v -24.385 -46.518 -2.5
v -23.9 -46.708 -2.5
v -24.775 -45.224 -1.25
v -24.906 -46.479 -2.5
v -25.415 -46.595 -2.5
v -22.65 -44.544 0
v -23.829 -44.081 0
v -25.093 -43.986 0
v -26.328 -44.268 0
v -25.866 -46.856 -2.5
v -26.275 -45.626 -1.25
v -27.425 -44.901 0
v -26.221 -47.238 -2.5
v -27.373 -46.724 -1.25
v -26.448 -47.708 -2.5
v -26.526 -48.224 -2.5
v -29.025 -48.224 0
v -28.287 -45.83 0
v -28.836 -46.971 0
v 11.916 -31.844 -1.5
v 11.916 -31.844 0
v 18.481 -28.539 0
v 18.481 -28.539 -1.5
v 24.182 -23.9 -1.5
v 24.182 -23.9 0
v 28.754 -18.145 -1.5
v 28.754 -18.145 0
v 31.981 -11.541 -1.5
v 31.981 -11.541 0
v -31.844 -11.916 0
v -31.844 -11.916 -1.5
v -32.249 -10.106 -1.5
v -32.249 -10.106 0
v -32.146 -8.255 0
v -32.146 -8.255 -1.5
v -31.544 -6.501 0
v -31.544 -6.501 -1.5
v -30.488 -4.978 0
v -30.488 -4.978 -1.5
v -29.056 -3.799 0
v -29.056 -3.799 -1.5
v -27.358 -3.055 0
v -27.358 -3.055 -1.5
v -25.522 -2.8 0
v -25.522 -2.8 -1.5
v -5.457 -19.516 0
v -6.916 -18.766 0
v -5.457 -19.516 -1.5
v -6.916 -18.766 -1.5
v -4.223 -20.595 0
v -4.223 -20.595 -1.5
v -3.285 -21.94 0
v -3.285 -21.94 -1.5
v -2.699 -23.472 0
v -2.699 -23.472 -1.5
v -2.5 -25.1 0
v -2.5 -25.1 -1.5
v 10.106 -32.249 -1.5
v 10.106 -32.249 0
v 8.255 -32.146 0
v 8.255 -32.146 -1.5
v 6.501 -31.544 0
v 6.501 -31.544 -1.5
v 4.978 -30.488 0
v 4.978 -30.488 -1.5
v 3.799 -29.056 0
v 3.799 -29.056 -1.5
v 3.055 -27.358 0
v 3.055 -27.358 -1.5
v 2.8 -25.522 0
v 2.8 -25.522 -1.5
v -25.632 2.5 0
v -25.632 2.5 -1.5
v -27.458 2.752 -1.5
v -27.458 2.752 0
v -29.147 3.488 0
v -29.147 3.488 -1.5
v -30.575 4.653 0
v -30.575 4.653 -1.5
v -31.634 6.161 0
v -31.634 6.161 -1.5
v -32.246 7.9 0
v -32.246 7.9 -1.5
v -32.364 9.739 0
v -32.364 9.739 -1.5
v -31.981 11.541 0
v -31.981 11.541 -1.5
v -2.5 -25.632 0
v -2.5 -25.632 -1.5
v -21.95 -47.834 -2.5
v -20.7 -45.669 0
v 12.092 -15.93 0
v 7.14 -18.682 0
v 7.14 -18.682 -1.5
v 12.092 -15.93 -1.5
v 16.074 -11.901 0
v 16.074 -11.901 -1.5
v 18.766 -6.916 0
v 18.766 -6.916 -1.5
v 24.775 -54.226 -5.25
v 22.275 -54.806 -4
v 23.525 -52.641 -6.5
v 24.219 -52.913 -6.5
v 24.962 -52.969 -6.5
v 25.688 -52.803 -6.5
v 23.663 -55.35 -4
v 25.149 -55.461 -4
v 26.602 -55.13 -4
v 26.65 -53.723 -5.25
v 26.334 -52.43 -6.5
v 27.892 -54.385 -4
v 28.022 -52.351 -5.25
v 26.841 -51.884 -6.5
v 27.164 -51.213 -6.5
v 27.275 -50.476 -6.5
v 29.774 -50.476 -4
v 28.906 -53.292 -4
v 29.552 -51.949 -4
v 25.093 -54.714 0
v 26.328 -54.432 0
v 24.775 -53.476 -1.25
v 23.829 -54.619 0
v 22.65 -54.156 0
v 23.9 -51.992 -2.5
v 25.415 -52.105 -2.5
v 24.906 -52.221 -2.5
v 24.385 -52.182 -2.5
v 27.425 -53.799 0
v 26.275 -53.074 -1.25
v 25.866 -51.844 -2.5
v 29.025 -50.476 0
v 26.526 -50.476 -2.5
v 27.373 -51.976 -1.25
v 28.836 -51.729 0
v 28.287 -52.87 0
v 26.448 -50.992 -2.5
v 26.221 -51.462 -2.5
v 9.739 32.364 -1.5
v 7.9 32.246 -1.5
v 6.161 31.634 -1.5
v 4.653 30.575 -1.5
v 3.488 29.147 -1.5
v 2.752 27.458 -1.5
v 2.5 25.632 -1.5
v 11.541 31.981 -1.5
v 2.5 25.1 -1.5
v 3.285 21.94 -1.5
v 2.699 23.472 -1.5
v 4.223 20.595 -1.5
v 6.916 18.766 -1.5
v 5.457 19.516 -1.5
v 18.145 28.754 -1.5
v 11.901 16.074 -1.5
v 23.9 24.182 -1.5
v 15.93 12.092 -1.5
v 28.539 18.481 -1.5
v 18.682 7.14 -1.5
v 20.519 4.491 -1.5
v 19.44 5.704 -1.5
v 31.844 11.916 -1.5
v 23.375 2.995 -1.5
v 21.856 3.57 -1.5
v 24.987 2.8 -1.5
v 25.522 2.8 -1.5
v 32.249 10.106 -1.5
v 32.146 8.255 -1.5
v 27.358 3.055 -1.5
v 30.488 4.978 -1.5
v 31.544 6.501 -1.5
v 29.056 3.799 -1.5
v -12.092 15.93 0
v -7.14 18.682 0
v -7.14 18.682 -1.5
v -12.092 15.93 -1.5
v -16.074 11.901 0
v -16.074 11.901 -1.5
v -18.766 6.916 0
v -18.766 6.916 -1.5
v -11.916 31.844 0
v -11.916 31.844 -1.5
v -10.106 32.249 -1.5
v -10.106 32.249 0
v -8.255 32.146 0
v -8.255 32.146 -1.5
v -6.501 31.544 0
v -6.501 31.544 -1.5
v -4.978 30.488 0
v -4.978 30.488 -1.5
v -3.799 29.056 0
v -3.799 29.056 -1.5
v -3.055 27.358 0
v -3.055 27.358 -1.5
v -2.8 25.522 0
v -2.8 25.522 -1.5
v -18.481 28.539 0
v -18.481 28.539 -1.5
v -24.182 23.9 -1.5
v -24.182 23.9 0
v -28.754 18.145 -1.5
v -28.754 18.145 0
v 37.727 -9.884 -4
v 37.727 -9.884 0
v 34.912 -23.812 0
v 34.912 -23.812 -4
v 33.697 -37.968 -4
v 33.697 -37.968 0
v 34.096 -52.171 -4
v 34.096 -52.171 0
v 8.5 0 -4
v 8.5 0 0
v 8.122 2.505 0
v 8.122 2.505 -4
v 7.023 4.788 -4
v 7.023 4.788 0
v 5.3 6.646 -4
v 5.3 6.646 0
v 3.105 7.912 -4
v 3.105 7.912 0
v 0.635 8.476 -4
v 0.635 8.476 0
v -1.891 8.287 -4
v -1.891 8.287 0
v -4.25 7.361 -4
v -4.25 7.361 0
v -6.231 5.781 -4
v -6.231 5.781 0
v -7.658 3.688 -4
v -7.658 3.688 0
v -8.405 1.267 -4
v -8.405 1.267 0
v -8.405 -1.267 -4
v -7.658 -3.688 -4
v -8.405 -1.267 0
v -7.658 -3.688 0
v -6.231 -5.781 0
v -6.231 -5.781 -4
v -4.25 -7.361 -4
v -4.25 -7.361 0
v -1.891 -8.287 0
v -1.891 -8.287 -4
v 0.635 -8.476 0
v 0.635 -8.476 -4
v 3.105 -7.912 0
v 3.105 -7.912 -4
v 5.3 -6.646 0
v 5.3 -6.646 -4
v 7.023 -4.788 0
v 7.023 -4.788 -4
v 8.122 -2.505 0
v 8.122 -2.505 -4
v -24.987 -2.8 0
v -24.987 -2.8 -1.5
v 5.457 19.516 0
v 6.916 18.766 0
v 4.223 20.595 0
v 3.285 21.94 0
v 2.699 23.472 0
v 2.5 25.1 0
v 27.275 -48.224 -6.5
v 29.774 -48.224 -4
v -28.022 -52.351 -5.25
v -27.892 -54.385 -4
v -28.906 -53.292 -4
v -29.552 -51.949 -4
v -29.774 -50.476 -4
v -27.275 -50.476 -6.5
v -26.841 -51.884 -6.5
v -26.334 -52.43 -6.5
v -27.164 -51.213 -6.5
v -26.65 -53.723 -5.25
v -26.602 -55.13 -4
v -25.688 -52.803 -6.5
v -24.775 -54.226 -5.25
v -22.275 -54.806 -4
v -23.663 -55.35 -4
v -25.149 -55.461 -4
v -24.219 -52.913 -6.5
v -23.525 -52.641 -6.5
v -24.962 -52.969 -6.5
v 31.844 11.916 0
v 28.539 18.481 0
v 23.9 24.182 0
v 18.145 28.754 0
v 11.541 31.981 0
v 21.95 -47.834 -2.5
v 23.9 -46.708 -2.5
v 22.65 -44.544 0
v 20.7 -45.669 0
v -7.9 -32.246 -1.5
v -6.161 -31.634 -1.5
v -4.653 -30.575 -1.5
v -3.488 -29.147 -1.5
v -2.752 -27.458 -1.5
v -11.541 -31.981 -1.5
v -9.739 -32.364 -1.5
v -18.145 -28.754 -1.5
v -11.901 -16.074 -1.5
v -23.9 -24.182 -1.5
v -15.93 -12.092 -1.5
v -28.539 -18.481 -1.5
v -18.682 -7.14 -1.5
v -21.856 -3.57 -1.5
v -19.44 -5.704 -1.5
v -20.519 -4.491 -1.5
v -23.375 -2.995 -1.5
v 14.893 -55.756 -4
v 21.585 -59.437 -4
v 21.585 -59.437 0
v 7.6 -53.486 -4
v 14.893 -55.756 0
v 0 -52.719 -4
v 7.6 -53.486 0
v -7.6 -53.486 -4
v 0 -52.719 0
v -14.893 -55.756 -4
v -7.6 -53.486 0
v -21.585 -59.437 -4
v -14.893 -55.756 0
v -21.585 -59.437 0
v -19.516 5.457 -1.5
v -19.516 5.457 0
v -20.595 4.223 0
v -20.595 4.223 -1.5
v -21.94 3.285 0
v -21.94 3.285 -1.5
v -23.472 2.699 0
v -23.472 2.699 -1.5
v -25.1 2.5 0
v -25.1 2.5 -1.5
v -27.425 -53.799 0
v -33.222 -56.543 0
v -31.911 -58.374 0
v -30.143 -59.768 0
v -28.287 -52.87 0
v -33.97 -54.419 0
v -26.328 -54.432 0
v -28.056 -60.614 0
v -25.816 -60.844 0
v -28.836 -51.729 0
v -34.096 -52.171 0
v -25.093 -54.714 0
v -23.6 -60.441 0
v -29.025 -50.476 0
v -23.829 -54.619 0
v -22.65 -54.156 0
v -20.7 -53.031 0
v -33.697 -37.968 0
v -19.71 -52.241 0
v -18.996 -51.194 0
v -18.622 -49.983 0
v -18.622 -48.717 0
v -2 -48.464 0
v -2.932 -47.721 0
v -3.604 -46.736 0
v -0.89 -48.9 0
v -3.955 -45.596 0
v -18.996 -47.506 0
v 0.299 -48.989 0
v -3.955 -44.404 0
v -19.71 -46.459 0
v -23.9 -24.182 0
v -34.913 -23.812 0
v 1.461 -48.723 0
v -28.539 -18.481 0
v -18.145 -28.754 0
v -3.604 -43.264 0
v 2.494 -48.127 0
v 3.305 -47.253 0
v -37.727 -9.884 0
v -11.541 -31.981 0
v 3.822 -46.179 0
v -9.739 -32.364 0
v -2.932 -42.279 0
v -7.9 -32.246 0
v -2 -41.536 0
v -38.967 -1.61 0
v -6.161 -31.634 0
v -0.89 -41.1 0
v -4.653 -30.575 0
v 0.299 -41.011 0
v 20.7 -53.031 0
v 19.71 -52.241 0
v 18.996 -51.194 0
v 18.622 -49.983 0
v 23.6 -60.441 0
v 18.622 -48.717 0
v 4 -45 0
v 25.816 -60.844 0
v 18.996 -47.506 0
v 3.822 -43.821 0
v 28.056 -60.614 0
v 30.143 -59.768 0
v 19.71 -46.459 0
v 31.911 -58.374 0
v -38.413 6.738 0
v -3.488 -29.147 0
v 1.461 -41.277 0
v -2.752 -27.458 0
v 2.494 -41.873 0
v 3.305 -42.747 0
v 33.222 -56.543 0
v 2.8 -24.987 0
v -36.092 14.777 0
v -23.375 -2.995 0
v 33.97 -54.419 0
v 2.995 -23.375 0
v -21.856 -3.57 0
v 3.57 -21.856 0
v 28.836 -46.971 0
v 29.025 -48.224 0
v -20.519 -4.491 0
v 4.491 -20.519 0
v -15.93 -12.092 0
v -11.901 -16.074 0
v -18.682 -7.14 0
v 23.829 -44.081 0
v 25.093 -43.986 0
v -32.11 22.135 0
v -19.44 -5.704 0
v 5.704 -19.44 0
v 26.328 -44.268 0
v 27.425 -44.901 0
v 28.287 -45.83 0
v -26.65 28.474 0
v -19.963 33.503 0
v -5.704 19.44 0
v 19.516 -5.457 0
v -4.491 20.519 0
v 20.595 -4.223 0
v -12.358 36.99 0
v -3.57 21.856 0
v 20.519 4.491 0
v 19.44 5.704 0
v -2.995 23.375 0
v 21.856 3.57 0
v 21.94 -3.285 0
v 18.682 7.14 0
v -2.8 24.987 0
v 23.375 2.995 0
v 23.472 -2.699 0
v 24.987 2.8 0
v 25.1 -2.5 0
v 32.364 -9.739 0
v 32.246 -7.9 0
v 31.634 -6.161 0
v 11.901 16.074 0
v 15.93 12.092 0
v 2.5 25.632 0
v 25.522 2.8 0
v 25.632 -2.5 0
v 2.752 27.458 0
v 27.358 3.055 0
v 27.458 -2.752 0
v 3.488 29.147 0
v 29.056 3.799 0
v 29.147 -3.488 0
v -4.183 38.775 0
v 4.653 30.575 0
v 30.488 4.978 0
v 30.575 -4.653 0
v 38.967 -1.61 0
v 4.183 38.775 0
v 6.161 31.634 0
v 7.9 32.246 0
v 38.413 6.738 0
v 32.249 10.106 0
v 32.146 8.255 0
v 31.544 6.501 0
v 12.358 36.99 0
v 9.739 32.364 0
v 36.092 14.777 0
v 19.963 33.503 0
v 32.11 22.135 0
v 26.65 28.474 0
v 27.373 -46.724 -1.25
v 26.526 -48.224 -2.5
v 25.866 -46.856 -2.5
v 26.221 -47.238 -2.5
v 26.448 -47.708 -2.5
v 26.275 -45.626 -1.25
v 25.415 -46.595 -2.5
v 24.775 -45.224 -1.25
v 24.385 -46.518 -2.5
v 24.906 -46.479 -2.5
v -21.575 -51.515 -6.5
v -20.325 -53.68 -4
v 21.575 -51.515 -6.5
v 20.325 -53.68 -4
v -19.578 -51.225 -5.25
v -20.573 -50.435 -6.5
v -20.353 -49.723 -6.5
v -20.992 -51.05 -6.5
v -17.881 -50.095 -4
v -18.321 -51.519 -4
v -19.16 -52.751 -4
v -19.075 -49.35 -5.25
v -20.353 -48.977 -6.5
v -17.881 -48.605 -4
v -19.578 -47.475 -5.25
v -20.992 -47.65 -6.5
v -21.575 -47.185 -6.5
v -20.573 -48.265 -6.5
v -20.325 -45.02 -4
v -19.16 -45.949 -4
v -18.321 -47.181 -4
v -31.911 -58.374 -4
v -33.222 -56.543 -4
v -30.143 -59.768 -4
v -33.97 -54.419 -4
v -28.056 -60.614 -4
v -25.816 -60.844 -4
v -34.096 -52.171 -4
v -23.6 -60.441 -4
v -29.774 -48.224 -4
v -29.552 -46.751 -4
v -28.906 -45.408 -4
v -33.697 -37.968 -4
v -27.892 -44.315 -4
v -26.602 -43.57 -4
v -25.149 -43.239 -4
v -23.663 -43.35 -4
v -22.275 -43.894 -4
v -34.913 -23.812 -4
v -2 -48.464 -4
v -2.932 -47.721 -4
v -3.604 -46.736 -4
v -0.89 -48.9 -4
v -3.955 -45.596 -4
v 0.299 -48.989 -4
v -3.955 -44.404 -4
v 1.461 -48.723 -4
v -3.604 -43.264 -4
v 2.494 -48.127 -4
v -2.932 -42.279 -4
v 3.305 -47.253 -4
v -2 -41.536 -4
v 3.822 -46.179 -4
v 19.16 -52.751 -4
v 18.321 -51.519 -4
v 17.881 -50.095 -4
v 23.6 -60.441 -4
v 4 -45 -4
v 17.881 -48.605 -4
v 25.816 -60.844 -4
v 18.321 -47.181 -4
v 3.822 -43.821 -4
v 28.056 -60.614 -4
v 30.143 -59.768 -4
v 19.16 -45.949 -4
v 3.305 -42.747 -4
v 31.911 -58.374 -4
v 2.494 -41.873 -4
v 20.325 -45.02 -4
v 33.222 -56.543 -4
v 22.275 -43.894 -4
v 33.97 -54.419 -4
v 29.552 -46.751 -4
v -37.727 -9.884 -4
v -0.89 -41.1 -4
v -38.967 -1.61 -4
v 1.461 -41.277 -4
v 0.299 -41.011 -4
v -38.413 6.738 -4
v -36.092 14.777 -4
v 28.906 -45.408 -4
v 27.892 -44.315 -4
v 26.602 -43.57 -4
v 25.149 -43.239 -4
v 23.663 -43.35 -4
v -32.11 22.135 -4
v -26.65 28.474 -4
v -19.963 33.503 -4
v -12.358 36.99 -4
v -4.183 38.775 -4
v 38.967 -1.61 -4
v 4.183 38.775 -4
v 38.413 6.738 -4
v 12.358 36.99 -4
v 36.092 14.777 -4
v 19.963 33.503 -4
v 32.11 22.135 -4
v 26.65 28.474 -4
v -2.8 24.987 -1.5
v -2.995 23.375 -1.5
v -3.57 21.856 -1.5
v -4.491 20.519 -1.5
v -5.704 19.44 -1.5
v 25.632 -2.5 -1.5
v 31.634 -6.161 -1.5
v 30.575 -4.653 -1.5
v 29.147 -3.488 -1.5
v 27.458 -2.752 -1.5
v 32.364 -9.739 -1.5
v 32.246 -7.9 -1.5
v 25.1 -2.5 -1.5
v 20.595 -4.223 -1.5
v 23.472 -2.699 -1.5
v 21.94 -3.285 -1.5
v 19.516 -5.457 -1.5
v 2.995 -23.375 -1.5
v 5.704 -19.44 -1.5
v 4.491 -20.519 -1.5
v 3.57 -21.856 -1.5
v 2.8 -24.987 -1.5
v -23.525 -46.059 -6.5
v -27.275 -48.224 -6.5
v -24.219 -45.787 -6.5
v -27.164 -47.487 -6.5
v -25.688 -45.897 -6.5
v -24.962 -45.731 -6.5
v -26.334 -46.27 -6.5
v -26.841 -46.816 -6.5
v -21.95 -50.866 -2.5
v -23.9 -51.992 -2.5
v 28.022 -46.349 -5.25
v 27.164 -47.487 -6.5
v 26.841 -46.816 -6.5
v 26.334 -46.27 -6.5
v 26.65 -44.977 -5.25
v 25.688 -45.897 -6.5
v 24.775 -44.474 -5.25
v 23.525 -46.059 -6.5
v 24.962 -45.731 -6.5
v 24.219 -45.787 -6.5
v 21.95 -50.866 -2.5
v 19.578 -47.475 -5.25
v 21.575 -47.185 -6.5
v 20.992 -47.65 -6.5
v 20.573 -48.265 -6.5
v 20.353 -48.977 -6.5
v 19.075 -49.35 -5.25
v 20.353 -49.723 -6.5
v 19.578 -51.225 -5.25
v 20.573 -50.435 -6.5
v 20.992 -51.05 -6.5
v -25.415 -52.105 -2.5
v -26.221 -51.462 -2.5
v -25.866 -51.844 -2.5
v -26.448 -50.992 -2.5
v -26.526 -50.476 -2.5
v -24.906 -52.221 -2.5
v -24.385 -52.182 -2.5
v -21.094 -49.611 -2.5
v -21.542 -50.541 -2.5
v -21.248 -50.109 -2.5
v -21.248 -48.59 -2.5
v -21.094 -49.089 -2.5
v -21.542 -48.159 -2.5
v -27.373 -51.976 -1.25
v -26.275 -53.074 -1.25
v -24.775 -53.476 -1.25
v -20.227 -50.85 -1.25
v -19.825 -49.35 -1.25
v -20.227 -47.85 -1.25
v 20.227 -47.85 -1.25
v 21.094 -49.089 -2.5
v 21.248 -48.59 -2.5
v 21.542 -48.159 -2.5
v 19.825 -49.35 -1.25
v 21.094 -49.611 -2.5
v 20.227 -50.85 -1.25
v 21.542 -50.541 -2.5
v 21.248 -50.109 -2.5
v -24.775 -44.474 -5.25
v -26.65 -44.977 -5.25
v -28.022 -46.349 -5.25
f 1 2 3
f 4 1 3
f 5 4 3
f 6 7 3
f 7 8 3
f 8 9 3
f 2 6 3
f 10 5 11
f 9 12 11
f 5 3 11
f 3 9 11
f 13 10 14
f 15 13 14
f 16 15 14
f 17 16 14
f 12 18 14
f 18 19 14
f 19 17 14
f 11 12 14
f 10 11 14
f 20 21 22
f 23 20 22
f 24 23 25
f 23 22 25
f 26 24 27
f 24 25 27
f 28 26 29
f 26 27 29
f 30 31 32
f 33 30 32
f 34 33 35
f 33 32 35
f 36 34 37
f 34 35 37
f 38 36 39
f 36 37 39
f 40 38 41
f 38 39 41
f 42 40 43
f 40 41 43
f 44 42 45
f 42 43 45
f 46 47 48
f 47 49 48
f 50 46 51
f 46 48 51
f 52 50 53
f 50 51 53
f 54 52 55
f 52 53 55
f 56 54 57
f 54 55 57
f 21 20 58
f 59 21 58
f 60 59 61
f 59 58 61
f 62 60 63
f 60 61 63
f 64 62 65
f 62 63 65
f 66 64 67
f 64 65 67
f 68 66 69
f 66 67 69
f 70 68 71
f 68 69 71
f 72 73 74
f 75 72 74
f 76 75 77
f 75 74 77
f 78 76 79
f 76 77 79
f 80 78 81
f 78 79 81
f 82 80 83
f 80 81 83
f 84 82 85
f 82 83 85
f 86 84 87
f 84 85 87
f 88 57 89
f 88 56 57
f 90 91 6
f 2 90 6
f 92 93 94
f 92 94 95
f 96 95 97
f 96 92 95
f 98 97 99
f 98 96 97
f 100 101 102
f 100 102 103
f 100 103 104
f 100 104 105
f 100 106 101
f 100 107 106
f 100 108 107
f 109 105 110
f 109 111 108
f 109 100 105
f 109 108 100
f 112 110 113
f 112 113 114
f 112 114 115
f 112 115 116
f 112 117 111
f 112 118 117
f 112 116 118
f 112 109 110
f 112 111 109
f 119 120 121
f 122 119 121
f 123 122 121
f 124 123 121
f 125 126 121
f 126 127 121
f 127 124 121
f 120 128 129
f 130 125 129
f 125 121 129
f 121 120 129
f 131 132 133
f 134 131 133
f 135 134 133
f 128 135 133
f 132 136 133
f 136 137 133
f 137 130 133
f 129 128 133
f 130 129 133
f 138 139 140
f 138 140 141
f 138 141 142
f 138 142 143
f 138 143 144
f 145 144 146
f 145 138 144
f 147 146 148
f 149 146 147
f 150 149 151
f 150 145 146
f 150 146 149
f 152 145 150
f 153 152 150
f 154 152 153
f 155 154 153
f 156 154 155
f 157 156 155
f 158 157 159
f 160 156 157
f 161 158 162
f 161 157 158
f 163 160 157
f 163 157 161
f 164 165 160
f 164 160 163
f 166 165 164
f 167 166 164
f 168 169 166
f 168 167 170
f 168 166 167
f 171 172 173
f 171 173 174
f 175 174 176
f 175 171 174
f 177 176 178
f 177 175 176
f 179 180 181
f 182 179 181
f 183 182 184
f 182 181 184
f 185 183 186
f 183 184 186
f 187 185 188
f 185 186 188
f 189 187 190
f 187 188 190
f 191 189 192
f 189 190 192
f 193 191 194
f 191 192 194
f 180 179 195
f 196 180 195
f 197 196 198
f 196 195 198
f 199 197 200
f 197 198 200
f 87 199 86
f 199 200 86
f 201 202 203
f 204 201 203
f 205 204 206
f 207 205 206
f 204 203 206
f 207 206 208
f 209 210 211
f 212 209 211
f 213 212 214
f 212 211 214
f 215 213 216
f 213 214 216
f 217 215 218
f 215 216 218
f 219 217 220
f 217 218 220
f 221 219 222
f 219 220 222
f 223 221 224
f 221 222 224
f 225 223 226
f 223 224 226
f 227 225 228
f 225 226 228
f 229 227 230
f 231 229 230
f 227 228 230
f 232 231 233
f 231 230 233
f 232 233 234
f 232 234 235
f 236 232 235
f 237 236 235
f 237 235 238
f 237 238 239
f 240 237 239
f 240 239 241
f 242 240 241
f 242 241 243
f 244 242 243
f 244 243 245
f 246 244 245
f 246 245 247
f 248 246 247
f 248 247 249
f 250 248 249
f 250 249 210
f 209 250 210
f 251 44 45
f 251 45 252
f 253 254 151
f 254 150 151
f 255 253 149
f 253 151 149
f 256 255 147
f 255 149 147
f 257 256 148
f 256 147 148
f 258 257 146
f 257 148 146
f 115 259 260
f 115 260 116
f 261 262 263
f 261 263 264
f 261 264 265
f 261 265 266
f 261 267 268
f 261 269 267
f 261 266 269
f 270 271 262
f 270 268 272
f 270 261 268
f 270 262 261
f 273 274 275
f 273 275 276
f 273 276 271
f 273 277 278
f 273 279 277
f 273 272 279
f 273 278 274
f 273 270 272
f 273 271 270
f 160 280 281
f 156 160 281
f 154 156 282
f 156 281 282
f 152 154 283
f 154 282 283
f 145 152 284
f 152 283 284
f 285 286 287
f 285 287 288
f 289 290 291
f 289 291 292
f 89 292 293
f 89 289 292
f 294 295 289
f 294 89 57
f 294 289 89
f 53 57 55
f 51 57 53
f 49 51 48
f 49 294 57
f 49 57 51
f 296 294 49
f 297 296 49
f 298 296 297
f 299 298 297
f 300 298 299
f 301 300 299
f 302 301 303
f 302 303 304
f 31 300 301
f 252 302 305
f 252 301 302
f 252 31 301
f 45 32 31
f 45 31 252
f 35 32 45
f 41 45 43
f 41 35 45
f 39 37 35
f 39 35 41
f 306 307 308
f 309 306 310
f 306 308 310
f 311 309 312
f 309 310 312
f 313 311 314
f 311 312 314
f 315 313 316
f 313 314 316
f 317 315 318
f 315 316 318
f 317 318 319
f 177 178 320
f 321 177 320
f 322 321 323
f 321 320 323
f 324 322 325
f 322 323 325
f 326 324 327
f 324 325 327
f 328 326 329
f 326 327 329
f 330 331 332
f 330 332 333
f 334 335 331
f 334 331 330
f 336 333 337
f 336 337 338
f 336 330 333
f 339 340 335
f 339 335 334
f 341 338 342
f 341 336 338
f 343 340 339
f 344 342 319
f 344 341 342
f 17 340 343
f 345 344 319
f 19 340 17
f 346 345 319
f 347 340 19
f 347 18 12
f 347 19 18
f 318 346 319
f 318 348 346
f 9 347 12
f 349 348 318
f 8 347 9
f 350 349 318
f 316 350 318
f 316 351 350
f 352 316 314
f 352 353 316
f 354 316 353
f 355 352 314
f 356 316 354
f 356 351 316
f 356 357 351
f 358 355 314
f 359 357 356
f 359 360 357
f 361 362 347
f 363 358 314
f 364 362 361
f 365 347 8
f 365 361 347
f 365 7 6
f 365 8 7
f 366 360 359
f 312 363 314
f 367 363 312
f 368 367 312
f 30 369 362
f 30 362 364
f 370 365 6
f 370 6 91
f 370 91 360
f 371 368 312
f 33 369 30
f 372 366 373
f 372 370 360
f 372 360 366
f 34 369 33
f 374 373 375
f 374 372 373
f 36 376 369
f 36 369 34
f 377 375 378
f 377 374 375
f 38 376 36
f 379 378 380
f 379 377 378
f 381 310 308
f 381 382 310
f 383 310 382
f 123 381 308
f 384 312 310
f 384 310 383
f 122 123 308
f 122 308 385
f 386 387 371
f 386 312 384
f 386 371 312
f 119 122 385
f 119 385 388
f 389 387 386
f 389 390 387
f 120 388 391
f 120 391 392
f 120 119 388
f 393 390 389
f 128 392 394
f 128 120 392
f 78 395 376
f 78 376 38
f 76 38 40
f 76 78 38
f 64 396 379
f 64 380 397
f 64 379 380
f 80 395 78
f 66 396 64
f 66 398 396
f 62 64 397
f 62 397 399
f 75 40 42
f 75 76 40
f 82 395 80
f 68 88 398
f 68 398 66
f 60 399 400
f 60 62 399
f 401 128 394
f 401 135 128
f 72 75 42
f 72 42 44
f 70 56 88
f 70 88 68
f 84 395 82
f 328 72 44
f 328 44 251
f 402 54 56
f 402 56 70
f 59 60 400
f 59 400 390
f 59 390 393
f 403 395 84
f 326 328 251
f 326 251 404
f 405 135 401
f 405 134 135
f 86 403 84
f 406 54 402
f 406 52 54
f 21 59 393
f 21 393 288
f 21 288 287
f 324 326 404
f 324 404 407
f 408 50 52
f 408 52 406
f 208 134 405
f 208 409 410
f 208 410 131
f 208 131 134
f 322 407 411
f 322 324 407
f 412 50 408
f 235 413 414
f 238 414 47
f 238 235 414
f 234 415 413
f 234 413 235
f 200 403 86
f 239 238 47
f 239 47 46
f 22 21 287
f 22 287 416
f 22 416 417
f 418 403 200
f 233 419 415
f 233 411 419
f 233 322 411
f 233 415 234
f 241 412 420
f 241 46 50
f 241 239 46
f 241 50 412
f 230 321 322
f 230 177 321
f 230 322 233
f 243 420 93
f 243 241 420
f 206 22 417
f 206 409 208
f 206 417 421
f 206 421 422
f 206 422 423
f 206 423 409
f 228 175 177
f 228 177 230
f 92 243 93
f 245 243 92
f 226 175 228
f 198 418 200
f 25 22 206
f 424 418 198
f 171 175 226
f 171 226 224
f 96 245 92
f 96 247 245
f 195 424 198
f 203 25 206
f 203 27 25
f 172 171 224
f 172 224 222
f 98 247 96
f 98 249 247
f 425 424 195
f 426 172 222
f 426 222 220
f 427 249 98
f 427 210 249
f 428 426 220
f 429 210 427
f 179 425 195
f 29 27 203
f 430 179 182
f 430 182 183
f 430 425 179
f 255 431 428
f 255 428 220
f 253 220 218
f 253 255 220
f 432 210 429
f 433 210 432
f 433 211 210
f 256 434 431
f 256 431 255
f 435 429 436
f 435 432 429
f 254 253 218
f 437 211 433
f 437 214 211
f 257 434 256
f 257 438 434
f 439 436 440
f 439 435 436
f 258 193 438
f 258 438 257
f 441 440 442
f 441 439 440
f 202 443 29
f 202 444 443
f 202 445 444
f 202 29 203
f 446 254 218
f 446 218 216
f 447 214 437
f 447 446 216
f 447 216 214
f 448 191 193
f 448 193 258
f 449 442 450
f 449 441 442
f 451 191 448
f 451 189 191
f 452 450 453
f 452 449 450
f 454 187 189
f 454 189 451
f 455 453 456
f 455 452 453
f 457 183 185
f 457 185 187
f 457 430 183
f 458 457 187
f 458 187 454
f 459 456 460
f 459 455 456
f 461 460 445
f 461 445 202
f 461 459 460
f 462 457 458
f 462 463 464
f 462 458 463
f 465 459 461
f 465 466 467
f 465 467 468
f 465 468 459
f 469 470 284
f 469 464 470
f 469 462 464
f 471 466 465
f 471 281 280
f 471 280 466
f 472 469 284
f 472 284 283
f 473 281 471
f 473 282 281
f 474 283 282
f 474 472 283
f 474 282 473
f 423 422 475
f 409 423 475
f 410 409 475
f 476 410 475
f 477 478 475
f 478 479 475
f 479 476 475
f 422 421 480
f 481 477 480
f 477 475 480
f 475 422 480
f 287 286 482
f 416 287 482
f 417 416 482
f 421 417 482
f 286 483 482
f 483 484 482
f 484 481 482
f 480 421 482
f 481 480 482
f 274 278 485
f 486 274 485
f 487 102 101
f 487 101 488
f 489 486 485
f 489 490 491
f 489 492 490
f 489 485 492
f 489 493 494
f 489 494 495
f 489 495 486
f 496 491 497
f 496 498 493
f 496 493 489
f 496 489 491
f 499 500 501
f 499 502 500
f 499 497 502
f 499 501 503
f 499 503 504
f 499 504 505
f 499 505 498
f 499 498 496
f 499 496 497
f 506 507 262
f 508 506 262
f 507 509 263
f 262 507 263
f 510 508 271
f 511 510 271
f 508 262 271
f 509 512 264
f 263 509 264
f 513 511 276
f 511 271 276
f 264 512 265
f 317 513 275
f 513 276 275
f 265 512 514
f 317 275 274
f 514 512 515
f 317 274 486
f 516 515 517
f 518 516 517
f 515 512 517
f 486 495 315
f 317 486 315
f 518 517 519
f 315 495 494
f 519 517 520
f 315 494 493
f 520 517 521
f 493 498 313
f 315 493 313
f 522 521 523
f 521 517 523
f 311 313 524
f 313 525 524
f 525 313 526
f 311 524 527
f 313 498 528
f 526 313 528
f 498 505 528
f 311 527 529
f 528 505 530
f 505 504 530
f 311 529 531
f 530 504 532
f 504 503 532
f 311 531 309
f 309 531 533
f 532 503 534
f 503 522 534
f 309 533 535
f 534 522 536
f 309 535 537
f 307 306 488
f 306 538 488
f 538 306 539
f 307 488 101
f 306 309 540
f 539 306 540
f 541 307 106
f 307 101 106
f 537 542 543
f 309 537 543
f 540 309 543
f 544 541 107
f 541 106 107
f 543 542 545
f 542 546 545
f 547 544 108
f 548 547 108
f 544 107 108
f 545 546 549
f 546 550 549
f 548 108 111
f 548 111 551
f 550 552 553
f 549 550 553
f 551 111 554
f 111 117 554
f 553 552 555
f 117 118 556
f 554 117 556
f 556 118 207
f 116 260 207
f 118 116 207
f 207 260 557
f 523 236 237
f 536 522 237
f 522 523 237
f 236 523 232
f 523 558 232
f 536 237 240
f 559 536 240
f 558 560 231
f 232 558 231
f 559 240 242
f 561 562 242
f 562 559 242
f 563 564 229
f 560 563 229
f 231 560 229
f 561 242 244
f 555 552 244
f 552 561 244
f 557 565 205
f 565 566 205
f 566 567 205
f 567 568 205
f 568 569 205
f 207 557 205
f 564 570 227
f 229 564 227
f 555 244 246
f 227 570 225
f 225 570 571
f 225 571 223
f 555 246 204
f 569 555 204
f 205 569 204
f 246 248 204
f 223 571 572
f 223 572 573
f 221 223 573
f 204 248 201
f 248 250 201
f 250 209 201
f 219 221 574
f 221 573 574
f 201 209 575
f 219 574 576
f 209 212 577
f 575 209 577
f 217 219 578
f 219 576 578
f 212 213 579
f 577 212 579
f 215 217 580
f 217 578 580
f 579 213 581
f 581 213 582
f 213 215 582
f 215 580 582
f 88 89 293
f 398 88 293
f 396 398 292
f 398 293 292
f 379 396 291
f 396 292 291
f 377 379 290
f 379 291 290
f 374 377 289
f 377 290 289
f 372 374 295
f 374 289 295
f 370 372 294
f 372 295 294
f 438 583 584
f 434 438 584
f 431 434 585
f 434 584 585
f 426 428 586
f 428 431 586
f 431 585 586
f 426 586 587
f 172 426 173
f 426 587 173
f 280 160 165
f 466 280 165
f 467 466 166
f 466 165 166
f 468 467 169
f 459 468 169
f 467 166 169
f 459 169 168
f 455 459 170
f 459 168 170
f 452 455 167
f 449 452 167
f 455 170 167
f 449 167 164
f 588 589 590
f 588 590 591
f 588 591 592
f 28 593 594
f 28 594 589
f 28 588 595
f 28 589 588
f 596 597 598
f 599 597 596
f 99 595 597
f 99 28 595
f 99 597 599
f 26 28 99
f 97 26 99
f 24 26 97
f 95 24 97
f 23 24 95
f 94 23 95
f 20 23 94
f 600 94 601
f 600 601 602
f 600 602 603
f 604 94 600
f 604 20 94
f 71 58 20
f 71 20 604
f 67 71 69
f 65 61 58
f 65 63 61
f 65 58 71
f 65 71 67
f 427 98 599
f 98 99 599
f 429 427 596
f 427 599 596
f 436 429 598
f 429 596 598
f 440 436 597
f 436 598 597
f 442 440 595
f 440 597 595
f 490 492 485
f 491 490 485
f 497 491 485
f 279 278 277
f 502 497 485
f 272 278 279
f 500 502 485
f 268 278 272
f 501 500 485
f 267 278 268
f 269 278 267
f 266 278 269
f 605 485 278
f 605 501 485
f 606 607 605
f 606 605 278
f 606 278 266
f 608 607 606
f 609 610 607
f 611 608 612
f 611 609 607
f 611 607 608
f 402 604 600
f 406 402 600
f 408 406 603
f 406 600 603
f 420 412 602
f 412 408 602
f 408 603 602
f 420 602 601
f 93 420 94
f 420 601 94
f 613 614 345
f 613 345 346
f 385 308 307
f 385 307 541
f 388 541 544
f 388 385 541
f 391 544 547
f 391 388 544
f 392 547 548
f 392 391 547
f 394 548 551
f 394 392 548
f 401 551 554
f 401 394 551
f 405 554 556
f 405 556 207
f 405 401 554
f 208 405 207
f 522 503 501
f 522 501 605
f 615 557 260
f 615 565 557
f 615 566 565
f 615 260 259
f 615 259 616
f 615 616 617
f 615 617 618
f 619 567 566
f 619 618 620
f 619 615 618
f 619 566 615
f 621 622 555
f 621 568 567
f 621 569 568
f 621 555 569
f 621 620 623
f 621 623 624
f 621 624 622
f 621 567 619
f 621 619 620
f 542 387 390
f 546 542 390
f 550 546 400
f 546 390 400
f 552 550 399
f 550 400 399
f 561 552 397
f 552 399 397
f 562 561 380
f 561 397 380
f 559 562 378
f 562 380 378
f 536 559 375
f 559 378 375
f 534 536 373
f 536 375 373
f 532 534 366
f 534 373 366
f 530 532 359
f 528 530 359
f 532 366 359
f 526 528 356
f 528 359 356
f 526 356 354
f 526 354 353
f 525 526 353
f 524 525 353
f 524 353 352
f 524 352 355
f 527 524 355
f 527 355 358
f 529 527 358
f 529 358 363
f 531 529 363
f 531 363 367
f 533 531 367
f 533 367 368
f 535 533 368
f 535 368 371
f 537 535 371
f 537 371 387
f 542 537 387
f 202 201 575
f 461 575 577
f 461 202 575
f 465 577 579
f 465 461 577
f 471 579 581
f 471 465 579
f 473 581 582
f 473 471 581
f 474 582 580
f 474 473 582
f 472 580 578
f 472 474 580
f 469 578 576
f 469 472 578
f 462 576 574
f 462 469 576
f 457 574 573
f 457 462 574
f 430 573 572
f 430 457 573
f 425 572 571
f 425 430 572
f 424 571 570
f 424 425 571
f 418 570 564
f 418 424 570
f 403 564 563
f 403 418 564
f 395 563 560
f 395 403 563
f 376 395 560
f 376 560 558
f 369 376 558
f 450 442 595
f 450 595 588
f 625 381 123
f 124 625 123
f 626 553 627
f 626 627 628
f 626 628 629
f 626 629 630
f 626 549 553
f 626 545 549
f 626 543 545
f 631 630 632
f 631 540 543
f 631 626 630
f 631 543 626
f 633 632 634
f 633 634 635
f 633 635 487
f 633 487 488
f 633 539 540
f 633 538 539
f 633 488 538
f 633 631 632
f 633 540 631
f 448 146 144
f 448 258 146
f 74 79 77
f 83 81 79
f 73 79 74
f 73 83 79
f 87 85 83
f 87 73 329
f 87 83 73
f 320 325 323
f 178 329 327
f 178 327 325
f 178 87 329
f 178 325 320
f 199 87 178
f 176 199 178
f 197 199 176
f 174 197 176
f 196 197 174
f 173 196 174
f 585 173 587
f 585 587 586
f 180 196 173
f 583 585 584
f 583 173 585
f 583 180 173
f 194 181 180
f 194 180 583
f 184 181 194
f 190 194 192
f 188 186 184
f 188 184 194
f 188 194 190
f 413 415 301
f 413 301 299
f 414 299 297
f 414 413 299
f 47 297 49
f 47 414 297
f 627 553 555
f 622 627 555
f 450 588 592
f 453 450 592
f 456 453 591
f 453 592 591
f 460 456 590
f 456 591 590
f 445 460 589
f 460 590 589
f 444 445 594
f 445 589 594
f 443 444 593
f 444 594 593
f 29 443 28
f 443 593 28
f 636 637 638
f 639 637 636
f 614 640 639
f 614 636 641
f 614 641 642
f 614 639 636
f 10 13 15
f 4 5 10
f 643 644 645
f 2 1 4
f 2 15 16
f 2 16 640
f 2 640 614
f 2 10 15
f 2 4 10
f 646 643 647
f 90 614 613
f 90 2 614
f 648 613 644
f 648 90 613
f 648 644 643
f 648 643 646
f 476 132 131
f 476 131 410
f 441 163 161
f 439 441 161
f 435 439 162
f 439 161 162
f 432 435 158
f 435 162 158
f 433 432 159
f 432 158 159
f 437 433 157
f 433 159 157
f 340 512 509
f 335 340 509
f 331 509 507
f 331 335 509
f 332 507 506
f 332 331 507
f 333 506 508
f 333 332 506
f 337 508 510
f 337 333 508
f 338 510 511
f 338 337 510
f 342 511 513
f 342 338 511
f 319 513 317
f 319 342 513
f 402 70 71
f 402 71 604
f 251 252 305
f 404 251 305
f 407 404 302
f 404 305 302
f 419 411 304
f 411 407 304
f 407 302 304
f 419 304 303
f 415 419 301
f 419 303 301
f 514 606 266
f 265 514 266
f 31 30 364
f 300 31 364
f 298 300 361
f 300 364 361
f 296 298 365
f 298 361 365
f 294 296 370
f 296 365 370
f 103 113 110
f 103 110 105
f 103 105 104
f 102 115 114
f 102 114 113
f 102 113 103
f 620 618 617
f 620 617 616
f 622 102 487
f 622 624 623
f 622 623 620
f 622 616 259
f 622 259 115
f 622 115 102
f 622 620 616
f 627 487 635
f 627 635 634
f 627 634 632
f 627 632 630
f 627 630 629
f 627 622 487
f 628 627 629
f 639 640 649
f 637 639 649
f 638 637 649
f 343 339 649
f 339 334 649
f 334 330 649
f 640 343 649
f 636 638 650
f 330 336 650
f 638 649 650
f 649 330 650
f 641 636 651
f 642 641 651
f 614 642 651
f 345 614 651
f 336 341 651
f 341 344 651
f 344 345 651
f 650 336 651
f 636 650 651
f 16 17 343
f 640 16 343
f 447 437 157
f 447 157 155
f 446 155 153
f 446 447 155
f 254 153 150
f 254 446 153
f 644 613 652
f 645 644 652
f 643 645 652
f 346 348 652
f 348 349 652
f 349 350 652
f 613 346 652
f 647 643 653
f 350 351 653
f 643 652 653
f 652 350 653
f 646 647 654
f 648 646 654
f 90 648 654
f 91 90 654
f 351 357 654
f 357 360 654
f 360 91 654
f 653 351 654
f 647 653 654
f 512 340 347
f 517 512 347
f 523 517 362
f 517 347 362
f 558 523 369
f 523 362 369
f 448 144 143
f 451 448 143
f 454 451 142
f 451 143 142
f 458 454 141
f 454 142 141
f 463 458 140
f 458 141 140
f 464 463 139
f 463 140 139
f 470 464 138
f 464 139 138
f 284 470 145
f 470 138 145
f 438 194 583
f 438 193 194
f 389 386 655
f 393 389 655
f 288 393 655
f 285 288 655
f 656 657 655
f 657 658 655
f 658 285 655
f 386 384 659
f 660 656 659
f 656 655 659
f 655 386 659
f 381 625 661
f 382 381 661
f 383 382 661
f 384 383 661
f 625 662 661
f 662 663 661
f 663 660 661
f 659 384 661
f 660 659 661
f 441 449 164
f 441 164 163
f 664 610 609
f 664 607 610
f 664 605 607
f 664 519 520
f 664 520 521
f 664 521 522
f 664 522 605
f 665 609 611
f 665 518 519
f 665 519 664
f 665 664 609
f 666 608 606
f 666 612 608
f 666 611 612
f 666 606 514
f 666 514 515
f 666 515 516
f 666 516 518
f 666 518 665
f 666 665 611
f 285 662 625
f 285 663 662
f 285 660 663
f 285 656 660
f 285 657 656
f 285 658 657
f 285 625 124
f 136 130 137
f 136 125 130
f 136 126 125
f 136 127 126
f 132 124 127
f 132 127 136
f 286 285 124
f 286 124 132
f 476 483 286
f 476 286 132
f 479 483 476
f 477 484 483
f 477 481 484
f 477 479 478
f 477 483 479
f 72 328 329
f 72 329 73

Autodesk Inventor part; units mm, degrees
ref_plane "YZ Plane" through (0, 0, 0) normal (1, 0, 0) x (0, 1, 0)
ref_plane "XZ Plane" through (0, 0, 0) normal (0, 1, 0) x (-1, 0, 0)
ref_plane "XY Plane" through (0, 0, 0) normal (0, 0, 1) x (1, 0, 0)
sketch "Sketch1" plane through (0, 0, 0) normal (0, 0, 1) x (1, 0, 0)
  arc A0 (37.7266, -9.8844) -> (-37.7266, -9.8844) centre (0, 0) ccw
  arc A1 (-34.0962, -52.1712) -> (-21.585, -59.437) centre (-26.125, -52.85) ccw
  arc A2 (21.585, -59.437) -> (34.0962, -52.1712) centre (26.125, -52.85) ccw
  arc A3 (-34.0962, -52.1712) -> (-37.7266, -9.8844) centre (-158.6454, -41.565) ccw
  line L0 (0, 64.9508) -> (0, -116.7047) projected
  arc A4 (21.585, -59.437) -> (-21.585, -59.437) centre (0, -90.7539) ccw
  arc A5 (37.7266, -9.8844) -> (34.0962, -52.1712) centre (158.6454, -41.565) ccw
  dimension "d0" = 16
  dimension "d2" = 78
  dimension "d3" = 52.85
  dimension "d5" = 26.125
  dimension "d8" = 317.2907
  dimension "d9" = 26.125
  dimension "d10" = 38.035
extrude "Extrusion1" add sketch "Sketch1" against normal blind 4
sketch "Sketch2" plane through (0, 0, -4) normal (0, 0, -1) x (-1, 0, 0)
  arc A0 (37.7266, -9.8844) -> (-37.7266, -9.8844) centre (0, 0) ccw projected
  arc A1 (-34.0962, -52.1712) -> (-21.585, -59.437) centre (-26.125, -52.85) ccw projected
  arc A2 (21.585, -59.437) -> (-21.585, -59.437) centre (0, -90.7539) ccw projected
  line L0 (-27.275, -50.4758) -> (-27.275, -48.2242)
  line L1 (-21.575, -51.5151) -> (-23.525, -52.6409)
  line L2 (-23.525, -46.0591) -> (-21.575, -47.1849)
  arc A3 (-23.525, -46.0591) -> (-27.275, -48.2242) centre (-24.775, -48.2242) ccw
  arc A4 (-27.275, -50.4758) -> (-23.525, -52.6409) centre (-24.775, -50.4758) ccw
  arc A5 (-21.575, -51.5151) -> (-21.575, -47.1849) centre (-22.825, -49.35) ccw
  line L3 (0, -116.7047) -> (0, 64.9508) projected
  point P0 (-27.275, 27.8761)
  point P1 (-32.4256, -57.7797)
  point P2 (-9.7764, -53.9968)
  dimension "d13" = 60
  dimension "d14" = 60
  dimension "d15" = 2.5
  dimension "d16" = 22.825
  dimension "d17" = 49.35
  dimension "d18" = 60
  dimension "d19" = 1.95
extrude "Extrusion2" add sketch "Sketch2" along normal blind 2.5
chamfer "Chamfer1" distance 2.5 angle 45 6 edges at (22.55, -52.078, -4) (26.025, -52.6409, -4) (27.275, -49.35, -4) (26.025, -46.0591, -4) (22.55, -46.622, -4) (20.325, -49.35, -4)
mirror "Mirror1" about plane through (0, 0, 0) normal (1, 0, 0) of "Extrusion2", "Chamfer1"
sketch "Sketch3" plane through (0, 0, 0) normal (0, 0, 1) x (1, 0, 0)
  line L0 (-23.525, -46.0591) -> (-21.575, -47.1849) projected
  arc A0 (-21.575, -51.5151) -> (-21.575, -47.1849) centre (-22.825, -49.35) ccw projected
  line L1 (-21.575, -51.5151) -> (-23.525, -52.6409) projected
  arc A1 (-27.275, -50.4758) -> (-23.525, -52.6409) centre (-24.775, -50.4758) ccw projected
  line L2 (-27.275, -50.4758) -> (-27.275, -48.2242) projected
  arc A2 (-23.525, -46.0591) -> (-27.275, -48.2242) centre (-24.775, -48.2242) ccw projected
  line L3 (-22.65, -54.1564) -> (-20.7, -53.0306)
  arc A3 (-20.7, -53.0306) -> (-20.7, -45.6694) centre (-22.825, -49.35) ccw
  line L4 (-20.7, -45.6694) -> (-22.65, -44.5436)
  arc A4 (-22.65, -44.5436) -> (-29.025, -48.2242) centre (-24.775, -48.2242) ccw
  line L5 (-29.025, -48.2242) -> (-29.025, -50.4758)
  arc A5 (-29.025, -50.4758) -> (-22.65, -54.1564) centre (-24.775, -50.4758) ccw
  dimension "d30" = 1.75
extrude "Extrusion3" cut sketch "Sketch3" against normal blind 2.5 contours L0 A0 L1 A1 L2 A2 | A5 L5 A4 L4 A3 L3
chamfer "Chamfer2" distance 2.5 angle 45 6 edges at (-26.9, -54.1564, -2.5) (-21.675, -53.5935, -2.5) (-18.575, -49.35, -2.5) (-21.675, -45.1065, -2.5) (-26.9, -44.5436, -2.5) (-29.025, -49.35, -2.5)
mirror "Mirror2" about plane through (0, 0, 0) normal (1, 0, 0) of "Extrusion3", "Chamfer2"
sketch "Sketch4" plane through (0, 0, 0) normal (0, 0, 1) x (1, 0, 0)
  circle A0 centre (0, 0) radius 8.5
  line L0 (0, 0) -> (0, -45)
  circle A1 centre (0, -45) radius 4
  dimension "d31" = 17
  dimension "d32" = 45
  dimension "d33" = 8
extrude "Extrusion4" cut sketch "Sketch4" against normal through all
sketch "Sketch5" plane through (0, 0, 0) normal (0, 0, 1) x (1, 0, 0)
  circle A0 centre (0, 0) radius 8.5 projected
  line L0 (-29.025, -50.4758) -> (-29.025, -48.2242) projected
  arc A1 (37.7266, -9.8844) -> (-37.7266, -9.8844) centre (0, 0) ccw projected
  arc A2 (-2.8, 33.8845) -> (-33.908, 2.5) centre (0, 0) ccw
  arc A3 (-2.8, 19.803) -> (-19.8431, 2.5) centre (0, 0) ccw
  line L1 (-2.8, 33.8845) -> (-2.8, 19.803)
  line L2 (-19.8431, 2.5) -> (-33.908, 2.5)
  dimension "d36" = 68
  dimension "d37" = 40
  dimension "d38" = 2.5
  dimension "d39" = 2.8
extrude "Extrusion5" cut sketch "Sketch5" against normal blind 1.5 contours L1 A3 L2 A2
fillet "Fillet1" radius 6.75 4 edges at (-2.8, 33.8845, -0.75) (-2.8, 19.803, -0.75) (-19.8431, 2.5, -0.75) (-33.908, 2.5, -0.75)
pattern_circular "Circular Pattern1" count 4 over 360 about axis through (0, 0, 0) along (0, 0, -1) of "Extrusion5", "Fillet1"
properties part number "201-09" material "Steel"
